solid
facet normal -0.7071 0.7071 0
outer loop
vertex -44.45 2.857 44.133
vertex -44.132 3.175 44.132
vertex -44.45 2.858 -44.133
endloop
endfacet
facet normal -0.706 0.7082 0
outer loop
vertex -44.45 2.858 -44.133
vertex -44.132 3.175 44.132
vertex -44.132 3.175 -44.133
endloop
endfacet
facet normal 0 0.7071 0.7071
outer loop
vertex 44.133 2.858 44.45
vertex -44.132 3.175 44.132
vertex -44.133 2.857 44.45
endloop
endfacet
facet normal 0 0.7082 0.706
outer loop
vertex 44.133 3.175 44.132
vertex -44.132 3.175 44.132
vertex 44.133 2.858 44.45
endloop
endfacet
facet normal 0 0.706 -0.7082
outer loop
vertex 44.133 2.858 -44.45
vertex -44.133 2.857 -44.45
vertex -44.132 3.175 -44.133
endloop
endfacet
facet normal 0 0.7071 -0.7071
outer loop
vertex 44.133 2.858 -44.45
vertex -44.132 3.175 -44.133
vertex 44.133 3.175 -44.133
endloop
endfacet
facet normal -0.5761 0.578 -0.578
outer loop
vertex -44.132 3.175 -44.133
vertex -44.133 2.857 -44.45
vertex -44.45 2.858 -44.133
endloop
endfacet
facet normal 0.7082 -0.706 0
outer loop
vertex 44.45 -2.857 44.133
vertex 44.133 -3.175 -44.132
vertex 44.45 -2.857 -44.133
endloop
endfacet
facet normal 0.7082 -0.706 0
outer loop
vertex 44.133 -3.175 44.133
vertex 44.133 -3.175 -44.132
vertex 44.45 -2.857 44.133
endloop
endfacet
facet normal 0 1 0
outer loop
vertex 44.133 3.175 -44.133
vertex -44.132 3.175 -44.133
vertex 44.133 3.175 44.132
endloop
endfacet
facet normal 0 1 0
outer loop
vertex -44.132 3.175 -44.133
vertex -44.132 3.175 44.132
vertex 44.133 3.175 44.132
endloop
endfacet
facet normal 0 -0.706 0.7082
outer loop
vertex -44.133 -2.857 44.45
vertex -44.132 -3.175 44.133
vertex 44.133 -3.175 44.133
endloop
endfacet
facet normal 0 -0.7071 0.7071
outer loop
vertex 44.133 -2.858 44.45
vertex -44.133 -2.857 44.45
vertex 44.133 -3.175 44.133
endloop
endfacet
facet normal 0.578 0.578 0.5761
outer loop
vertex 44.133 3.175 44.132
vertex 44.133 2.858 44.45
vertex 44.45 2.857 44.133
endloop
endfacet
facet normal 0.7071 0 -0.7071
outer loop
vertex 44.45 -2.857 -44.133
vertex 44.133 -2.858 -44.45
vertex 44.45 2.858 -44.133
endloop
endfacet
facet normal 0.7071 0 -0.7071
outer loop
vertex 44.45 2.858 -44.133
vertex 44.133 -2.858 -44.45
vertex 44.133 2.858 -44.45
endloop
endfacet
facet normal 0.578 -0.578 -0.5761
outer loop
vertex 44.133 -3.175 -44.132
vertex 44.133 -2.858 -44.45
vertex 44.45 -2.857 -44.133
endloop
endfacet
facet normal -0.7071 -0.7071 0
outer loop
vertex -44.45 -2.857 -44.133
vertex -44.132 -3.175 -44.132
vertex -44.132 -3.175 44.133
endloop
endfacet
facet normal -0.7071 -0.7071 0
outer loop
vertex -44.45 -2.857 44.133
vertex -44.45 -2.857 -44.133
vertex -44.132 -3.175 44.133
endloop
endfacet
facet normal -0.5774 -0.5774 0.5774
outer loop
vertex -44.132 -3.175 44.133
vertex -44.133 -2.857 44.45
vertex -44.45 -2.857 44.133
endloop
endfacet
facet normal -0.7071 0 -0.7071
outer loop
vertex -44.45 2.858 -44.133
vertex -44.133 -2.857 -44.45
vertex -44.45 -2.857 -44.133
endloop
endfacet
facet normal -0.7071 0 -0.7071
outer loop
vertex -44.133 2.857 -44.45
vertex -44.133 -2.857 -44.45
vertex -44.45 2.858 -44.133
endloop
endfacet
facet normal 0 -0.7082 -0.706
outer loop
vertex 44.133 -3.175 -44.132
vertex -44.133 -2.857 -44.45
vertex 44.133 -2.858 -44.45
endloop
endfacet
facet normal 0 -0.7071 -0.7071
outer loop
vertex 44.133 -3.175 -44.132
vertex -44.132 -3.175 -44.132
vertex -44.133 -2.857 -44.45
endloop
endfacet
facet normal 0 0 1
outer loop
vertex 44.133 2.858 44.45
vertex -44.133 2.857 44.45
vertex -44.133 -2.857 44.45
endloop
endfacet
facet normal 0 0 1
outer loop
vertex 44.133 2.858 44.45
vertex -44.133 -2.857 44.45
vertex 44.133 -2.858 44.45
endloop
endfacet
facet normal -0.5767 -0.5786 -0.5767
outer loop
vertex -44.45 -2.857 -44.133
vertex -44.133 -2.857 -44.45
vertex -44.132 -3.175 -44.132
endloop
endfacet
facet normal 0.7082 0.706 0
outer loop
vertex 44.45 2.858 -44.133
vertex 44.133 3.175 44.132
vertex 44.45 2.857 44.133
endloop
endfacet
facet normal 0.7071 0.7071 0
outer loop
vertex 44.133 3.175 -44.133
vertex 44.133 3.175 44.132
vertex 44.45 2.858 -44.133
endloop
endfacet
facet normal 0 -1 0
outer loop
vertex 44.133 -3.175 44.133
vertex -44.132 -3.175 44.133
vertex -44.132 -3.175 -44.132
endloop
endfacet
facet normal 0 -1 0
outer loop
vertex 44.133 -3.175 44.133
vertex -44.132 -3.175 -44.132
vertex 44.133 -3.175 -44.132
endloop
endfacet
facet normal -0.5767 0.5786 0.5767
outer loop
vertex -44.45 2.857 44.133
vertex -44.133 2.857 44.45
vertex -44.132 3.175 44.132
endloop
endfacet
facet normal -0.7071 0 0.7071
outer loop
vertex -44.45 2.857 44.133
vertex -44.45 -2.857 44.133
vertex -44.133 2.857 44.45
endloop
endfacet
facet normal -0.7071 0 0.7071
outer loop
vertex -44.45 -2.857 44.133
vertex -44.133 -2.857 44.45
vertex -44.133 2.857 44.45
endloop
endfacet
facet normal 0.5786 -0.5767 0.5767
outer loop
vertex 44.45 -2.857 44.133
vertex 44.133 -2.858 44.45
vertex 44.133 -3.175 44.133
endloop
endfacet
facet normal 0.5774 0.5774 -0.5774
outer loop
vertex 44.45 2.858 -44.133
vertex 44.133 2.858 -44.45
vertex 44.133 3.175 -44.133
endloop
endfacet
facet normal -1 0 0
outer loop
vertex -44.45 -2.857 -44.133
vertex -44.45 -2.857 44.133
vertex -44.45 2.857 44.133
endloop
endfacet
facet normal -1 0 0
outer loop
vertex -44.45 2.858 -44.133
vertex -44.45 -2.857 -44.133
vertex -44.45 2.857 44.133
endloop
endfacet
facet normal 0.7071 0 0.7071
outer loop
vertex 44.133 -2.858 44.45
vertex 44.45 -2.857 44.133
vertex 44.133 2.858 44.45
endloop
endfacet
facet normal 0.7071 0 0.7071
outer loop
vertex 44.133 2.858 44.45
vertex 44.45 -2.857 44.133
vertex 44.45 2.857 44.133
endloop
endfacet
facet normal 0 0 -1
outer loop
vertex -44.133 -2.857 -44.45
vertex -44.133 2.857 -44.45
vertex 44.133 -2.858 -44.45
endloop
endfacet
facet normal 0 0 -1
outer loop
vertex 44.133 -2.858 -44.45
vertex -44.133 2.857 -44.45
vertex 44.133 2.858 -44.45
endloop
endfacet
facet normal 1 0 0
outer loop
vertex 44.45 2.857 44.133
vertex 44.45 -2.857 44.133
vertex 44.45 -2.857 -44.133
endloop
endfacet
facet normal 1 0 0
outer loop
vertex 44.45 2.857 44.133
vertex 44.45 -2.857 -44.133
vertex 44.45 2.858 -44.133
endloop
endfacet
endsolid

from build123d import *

# Parameters (mm, degrees)
SKETCH3_W           = 88.9
SKETCH3_H           = 6.35
BOSS_EXTRUDE1_DEPTH = 44.45
CHAMFER1_SIZE       = 0.3175


with BuildPart() as part:
    # Sketch3 → Boss-Extrude1 (new, symmetric)
    with BuildSketch(Plane.XY):
        Rectangle(SKETCH3_W, SKETCH3_H)
    extrude(amount=BOSS_EXTRUDE1_DEPTH, both=True)

    # Chamfer1
    chamfer1_edges = [part.edges().sort_by_distance(p)[0] for p in [
        (-44.45, 0, 44.45),
        (0, -3.175, 44.45),
        (44.45, 0, 44.45),
        (0, -3.175, -44.45),
        (-44.45, 0, -44.45),
        (0, 3.175, -44.45),
        (44.45, 0, -44.45),
        (0, 3.175, 44.45),
        (44.45, -3.175, 0),
        (-44.45, -3.175, 0),
        (-44.45, 3.175, 0),
        (44.45, 3.175, 0),
    ]]
    chamfer(chamfer1_edges, length=CHAMFER1_SIZE)


solid = part.part
